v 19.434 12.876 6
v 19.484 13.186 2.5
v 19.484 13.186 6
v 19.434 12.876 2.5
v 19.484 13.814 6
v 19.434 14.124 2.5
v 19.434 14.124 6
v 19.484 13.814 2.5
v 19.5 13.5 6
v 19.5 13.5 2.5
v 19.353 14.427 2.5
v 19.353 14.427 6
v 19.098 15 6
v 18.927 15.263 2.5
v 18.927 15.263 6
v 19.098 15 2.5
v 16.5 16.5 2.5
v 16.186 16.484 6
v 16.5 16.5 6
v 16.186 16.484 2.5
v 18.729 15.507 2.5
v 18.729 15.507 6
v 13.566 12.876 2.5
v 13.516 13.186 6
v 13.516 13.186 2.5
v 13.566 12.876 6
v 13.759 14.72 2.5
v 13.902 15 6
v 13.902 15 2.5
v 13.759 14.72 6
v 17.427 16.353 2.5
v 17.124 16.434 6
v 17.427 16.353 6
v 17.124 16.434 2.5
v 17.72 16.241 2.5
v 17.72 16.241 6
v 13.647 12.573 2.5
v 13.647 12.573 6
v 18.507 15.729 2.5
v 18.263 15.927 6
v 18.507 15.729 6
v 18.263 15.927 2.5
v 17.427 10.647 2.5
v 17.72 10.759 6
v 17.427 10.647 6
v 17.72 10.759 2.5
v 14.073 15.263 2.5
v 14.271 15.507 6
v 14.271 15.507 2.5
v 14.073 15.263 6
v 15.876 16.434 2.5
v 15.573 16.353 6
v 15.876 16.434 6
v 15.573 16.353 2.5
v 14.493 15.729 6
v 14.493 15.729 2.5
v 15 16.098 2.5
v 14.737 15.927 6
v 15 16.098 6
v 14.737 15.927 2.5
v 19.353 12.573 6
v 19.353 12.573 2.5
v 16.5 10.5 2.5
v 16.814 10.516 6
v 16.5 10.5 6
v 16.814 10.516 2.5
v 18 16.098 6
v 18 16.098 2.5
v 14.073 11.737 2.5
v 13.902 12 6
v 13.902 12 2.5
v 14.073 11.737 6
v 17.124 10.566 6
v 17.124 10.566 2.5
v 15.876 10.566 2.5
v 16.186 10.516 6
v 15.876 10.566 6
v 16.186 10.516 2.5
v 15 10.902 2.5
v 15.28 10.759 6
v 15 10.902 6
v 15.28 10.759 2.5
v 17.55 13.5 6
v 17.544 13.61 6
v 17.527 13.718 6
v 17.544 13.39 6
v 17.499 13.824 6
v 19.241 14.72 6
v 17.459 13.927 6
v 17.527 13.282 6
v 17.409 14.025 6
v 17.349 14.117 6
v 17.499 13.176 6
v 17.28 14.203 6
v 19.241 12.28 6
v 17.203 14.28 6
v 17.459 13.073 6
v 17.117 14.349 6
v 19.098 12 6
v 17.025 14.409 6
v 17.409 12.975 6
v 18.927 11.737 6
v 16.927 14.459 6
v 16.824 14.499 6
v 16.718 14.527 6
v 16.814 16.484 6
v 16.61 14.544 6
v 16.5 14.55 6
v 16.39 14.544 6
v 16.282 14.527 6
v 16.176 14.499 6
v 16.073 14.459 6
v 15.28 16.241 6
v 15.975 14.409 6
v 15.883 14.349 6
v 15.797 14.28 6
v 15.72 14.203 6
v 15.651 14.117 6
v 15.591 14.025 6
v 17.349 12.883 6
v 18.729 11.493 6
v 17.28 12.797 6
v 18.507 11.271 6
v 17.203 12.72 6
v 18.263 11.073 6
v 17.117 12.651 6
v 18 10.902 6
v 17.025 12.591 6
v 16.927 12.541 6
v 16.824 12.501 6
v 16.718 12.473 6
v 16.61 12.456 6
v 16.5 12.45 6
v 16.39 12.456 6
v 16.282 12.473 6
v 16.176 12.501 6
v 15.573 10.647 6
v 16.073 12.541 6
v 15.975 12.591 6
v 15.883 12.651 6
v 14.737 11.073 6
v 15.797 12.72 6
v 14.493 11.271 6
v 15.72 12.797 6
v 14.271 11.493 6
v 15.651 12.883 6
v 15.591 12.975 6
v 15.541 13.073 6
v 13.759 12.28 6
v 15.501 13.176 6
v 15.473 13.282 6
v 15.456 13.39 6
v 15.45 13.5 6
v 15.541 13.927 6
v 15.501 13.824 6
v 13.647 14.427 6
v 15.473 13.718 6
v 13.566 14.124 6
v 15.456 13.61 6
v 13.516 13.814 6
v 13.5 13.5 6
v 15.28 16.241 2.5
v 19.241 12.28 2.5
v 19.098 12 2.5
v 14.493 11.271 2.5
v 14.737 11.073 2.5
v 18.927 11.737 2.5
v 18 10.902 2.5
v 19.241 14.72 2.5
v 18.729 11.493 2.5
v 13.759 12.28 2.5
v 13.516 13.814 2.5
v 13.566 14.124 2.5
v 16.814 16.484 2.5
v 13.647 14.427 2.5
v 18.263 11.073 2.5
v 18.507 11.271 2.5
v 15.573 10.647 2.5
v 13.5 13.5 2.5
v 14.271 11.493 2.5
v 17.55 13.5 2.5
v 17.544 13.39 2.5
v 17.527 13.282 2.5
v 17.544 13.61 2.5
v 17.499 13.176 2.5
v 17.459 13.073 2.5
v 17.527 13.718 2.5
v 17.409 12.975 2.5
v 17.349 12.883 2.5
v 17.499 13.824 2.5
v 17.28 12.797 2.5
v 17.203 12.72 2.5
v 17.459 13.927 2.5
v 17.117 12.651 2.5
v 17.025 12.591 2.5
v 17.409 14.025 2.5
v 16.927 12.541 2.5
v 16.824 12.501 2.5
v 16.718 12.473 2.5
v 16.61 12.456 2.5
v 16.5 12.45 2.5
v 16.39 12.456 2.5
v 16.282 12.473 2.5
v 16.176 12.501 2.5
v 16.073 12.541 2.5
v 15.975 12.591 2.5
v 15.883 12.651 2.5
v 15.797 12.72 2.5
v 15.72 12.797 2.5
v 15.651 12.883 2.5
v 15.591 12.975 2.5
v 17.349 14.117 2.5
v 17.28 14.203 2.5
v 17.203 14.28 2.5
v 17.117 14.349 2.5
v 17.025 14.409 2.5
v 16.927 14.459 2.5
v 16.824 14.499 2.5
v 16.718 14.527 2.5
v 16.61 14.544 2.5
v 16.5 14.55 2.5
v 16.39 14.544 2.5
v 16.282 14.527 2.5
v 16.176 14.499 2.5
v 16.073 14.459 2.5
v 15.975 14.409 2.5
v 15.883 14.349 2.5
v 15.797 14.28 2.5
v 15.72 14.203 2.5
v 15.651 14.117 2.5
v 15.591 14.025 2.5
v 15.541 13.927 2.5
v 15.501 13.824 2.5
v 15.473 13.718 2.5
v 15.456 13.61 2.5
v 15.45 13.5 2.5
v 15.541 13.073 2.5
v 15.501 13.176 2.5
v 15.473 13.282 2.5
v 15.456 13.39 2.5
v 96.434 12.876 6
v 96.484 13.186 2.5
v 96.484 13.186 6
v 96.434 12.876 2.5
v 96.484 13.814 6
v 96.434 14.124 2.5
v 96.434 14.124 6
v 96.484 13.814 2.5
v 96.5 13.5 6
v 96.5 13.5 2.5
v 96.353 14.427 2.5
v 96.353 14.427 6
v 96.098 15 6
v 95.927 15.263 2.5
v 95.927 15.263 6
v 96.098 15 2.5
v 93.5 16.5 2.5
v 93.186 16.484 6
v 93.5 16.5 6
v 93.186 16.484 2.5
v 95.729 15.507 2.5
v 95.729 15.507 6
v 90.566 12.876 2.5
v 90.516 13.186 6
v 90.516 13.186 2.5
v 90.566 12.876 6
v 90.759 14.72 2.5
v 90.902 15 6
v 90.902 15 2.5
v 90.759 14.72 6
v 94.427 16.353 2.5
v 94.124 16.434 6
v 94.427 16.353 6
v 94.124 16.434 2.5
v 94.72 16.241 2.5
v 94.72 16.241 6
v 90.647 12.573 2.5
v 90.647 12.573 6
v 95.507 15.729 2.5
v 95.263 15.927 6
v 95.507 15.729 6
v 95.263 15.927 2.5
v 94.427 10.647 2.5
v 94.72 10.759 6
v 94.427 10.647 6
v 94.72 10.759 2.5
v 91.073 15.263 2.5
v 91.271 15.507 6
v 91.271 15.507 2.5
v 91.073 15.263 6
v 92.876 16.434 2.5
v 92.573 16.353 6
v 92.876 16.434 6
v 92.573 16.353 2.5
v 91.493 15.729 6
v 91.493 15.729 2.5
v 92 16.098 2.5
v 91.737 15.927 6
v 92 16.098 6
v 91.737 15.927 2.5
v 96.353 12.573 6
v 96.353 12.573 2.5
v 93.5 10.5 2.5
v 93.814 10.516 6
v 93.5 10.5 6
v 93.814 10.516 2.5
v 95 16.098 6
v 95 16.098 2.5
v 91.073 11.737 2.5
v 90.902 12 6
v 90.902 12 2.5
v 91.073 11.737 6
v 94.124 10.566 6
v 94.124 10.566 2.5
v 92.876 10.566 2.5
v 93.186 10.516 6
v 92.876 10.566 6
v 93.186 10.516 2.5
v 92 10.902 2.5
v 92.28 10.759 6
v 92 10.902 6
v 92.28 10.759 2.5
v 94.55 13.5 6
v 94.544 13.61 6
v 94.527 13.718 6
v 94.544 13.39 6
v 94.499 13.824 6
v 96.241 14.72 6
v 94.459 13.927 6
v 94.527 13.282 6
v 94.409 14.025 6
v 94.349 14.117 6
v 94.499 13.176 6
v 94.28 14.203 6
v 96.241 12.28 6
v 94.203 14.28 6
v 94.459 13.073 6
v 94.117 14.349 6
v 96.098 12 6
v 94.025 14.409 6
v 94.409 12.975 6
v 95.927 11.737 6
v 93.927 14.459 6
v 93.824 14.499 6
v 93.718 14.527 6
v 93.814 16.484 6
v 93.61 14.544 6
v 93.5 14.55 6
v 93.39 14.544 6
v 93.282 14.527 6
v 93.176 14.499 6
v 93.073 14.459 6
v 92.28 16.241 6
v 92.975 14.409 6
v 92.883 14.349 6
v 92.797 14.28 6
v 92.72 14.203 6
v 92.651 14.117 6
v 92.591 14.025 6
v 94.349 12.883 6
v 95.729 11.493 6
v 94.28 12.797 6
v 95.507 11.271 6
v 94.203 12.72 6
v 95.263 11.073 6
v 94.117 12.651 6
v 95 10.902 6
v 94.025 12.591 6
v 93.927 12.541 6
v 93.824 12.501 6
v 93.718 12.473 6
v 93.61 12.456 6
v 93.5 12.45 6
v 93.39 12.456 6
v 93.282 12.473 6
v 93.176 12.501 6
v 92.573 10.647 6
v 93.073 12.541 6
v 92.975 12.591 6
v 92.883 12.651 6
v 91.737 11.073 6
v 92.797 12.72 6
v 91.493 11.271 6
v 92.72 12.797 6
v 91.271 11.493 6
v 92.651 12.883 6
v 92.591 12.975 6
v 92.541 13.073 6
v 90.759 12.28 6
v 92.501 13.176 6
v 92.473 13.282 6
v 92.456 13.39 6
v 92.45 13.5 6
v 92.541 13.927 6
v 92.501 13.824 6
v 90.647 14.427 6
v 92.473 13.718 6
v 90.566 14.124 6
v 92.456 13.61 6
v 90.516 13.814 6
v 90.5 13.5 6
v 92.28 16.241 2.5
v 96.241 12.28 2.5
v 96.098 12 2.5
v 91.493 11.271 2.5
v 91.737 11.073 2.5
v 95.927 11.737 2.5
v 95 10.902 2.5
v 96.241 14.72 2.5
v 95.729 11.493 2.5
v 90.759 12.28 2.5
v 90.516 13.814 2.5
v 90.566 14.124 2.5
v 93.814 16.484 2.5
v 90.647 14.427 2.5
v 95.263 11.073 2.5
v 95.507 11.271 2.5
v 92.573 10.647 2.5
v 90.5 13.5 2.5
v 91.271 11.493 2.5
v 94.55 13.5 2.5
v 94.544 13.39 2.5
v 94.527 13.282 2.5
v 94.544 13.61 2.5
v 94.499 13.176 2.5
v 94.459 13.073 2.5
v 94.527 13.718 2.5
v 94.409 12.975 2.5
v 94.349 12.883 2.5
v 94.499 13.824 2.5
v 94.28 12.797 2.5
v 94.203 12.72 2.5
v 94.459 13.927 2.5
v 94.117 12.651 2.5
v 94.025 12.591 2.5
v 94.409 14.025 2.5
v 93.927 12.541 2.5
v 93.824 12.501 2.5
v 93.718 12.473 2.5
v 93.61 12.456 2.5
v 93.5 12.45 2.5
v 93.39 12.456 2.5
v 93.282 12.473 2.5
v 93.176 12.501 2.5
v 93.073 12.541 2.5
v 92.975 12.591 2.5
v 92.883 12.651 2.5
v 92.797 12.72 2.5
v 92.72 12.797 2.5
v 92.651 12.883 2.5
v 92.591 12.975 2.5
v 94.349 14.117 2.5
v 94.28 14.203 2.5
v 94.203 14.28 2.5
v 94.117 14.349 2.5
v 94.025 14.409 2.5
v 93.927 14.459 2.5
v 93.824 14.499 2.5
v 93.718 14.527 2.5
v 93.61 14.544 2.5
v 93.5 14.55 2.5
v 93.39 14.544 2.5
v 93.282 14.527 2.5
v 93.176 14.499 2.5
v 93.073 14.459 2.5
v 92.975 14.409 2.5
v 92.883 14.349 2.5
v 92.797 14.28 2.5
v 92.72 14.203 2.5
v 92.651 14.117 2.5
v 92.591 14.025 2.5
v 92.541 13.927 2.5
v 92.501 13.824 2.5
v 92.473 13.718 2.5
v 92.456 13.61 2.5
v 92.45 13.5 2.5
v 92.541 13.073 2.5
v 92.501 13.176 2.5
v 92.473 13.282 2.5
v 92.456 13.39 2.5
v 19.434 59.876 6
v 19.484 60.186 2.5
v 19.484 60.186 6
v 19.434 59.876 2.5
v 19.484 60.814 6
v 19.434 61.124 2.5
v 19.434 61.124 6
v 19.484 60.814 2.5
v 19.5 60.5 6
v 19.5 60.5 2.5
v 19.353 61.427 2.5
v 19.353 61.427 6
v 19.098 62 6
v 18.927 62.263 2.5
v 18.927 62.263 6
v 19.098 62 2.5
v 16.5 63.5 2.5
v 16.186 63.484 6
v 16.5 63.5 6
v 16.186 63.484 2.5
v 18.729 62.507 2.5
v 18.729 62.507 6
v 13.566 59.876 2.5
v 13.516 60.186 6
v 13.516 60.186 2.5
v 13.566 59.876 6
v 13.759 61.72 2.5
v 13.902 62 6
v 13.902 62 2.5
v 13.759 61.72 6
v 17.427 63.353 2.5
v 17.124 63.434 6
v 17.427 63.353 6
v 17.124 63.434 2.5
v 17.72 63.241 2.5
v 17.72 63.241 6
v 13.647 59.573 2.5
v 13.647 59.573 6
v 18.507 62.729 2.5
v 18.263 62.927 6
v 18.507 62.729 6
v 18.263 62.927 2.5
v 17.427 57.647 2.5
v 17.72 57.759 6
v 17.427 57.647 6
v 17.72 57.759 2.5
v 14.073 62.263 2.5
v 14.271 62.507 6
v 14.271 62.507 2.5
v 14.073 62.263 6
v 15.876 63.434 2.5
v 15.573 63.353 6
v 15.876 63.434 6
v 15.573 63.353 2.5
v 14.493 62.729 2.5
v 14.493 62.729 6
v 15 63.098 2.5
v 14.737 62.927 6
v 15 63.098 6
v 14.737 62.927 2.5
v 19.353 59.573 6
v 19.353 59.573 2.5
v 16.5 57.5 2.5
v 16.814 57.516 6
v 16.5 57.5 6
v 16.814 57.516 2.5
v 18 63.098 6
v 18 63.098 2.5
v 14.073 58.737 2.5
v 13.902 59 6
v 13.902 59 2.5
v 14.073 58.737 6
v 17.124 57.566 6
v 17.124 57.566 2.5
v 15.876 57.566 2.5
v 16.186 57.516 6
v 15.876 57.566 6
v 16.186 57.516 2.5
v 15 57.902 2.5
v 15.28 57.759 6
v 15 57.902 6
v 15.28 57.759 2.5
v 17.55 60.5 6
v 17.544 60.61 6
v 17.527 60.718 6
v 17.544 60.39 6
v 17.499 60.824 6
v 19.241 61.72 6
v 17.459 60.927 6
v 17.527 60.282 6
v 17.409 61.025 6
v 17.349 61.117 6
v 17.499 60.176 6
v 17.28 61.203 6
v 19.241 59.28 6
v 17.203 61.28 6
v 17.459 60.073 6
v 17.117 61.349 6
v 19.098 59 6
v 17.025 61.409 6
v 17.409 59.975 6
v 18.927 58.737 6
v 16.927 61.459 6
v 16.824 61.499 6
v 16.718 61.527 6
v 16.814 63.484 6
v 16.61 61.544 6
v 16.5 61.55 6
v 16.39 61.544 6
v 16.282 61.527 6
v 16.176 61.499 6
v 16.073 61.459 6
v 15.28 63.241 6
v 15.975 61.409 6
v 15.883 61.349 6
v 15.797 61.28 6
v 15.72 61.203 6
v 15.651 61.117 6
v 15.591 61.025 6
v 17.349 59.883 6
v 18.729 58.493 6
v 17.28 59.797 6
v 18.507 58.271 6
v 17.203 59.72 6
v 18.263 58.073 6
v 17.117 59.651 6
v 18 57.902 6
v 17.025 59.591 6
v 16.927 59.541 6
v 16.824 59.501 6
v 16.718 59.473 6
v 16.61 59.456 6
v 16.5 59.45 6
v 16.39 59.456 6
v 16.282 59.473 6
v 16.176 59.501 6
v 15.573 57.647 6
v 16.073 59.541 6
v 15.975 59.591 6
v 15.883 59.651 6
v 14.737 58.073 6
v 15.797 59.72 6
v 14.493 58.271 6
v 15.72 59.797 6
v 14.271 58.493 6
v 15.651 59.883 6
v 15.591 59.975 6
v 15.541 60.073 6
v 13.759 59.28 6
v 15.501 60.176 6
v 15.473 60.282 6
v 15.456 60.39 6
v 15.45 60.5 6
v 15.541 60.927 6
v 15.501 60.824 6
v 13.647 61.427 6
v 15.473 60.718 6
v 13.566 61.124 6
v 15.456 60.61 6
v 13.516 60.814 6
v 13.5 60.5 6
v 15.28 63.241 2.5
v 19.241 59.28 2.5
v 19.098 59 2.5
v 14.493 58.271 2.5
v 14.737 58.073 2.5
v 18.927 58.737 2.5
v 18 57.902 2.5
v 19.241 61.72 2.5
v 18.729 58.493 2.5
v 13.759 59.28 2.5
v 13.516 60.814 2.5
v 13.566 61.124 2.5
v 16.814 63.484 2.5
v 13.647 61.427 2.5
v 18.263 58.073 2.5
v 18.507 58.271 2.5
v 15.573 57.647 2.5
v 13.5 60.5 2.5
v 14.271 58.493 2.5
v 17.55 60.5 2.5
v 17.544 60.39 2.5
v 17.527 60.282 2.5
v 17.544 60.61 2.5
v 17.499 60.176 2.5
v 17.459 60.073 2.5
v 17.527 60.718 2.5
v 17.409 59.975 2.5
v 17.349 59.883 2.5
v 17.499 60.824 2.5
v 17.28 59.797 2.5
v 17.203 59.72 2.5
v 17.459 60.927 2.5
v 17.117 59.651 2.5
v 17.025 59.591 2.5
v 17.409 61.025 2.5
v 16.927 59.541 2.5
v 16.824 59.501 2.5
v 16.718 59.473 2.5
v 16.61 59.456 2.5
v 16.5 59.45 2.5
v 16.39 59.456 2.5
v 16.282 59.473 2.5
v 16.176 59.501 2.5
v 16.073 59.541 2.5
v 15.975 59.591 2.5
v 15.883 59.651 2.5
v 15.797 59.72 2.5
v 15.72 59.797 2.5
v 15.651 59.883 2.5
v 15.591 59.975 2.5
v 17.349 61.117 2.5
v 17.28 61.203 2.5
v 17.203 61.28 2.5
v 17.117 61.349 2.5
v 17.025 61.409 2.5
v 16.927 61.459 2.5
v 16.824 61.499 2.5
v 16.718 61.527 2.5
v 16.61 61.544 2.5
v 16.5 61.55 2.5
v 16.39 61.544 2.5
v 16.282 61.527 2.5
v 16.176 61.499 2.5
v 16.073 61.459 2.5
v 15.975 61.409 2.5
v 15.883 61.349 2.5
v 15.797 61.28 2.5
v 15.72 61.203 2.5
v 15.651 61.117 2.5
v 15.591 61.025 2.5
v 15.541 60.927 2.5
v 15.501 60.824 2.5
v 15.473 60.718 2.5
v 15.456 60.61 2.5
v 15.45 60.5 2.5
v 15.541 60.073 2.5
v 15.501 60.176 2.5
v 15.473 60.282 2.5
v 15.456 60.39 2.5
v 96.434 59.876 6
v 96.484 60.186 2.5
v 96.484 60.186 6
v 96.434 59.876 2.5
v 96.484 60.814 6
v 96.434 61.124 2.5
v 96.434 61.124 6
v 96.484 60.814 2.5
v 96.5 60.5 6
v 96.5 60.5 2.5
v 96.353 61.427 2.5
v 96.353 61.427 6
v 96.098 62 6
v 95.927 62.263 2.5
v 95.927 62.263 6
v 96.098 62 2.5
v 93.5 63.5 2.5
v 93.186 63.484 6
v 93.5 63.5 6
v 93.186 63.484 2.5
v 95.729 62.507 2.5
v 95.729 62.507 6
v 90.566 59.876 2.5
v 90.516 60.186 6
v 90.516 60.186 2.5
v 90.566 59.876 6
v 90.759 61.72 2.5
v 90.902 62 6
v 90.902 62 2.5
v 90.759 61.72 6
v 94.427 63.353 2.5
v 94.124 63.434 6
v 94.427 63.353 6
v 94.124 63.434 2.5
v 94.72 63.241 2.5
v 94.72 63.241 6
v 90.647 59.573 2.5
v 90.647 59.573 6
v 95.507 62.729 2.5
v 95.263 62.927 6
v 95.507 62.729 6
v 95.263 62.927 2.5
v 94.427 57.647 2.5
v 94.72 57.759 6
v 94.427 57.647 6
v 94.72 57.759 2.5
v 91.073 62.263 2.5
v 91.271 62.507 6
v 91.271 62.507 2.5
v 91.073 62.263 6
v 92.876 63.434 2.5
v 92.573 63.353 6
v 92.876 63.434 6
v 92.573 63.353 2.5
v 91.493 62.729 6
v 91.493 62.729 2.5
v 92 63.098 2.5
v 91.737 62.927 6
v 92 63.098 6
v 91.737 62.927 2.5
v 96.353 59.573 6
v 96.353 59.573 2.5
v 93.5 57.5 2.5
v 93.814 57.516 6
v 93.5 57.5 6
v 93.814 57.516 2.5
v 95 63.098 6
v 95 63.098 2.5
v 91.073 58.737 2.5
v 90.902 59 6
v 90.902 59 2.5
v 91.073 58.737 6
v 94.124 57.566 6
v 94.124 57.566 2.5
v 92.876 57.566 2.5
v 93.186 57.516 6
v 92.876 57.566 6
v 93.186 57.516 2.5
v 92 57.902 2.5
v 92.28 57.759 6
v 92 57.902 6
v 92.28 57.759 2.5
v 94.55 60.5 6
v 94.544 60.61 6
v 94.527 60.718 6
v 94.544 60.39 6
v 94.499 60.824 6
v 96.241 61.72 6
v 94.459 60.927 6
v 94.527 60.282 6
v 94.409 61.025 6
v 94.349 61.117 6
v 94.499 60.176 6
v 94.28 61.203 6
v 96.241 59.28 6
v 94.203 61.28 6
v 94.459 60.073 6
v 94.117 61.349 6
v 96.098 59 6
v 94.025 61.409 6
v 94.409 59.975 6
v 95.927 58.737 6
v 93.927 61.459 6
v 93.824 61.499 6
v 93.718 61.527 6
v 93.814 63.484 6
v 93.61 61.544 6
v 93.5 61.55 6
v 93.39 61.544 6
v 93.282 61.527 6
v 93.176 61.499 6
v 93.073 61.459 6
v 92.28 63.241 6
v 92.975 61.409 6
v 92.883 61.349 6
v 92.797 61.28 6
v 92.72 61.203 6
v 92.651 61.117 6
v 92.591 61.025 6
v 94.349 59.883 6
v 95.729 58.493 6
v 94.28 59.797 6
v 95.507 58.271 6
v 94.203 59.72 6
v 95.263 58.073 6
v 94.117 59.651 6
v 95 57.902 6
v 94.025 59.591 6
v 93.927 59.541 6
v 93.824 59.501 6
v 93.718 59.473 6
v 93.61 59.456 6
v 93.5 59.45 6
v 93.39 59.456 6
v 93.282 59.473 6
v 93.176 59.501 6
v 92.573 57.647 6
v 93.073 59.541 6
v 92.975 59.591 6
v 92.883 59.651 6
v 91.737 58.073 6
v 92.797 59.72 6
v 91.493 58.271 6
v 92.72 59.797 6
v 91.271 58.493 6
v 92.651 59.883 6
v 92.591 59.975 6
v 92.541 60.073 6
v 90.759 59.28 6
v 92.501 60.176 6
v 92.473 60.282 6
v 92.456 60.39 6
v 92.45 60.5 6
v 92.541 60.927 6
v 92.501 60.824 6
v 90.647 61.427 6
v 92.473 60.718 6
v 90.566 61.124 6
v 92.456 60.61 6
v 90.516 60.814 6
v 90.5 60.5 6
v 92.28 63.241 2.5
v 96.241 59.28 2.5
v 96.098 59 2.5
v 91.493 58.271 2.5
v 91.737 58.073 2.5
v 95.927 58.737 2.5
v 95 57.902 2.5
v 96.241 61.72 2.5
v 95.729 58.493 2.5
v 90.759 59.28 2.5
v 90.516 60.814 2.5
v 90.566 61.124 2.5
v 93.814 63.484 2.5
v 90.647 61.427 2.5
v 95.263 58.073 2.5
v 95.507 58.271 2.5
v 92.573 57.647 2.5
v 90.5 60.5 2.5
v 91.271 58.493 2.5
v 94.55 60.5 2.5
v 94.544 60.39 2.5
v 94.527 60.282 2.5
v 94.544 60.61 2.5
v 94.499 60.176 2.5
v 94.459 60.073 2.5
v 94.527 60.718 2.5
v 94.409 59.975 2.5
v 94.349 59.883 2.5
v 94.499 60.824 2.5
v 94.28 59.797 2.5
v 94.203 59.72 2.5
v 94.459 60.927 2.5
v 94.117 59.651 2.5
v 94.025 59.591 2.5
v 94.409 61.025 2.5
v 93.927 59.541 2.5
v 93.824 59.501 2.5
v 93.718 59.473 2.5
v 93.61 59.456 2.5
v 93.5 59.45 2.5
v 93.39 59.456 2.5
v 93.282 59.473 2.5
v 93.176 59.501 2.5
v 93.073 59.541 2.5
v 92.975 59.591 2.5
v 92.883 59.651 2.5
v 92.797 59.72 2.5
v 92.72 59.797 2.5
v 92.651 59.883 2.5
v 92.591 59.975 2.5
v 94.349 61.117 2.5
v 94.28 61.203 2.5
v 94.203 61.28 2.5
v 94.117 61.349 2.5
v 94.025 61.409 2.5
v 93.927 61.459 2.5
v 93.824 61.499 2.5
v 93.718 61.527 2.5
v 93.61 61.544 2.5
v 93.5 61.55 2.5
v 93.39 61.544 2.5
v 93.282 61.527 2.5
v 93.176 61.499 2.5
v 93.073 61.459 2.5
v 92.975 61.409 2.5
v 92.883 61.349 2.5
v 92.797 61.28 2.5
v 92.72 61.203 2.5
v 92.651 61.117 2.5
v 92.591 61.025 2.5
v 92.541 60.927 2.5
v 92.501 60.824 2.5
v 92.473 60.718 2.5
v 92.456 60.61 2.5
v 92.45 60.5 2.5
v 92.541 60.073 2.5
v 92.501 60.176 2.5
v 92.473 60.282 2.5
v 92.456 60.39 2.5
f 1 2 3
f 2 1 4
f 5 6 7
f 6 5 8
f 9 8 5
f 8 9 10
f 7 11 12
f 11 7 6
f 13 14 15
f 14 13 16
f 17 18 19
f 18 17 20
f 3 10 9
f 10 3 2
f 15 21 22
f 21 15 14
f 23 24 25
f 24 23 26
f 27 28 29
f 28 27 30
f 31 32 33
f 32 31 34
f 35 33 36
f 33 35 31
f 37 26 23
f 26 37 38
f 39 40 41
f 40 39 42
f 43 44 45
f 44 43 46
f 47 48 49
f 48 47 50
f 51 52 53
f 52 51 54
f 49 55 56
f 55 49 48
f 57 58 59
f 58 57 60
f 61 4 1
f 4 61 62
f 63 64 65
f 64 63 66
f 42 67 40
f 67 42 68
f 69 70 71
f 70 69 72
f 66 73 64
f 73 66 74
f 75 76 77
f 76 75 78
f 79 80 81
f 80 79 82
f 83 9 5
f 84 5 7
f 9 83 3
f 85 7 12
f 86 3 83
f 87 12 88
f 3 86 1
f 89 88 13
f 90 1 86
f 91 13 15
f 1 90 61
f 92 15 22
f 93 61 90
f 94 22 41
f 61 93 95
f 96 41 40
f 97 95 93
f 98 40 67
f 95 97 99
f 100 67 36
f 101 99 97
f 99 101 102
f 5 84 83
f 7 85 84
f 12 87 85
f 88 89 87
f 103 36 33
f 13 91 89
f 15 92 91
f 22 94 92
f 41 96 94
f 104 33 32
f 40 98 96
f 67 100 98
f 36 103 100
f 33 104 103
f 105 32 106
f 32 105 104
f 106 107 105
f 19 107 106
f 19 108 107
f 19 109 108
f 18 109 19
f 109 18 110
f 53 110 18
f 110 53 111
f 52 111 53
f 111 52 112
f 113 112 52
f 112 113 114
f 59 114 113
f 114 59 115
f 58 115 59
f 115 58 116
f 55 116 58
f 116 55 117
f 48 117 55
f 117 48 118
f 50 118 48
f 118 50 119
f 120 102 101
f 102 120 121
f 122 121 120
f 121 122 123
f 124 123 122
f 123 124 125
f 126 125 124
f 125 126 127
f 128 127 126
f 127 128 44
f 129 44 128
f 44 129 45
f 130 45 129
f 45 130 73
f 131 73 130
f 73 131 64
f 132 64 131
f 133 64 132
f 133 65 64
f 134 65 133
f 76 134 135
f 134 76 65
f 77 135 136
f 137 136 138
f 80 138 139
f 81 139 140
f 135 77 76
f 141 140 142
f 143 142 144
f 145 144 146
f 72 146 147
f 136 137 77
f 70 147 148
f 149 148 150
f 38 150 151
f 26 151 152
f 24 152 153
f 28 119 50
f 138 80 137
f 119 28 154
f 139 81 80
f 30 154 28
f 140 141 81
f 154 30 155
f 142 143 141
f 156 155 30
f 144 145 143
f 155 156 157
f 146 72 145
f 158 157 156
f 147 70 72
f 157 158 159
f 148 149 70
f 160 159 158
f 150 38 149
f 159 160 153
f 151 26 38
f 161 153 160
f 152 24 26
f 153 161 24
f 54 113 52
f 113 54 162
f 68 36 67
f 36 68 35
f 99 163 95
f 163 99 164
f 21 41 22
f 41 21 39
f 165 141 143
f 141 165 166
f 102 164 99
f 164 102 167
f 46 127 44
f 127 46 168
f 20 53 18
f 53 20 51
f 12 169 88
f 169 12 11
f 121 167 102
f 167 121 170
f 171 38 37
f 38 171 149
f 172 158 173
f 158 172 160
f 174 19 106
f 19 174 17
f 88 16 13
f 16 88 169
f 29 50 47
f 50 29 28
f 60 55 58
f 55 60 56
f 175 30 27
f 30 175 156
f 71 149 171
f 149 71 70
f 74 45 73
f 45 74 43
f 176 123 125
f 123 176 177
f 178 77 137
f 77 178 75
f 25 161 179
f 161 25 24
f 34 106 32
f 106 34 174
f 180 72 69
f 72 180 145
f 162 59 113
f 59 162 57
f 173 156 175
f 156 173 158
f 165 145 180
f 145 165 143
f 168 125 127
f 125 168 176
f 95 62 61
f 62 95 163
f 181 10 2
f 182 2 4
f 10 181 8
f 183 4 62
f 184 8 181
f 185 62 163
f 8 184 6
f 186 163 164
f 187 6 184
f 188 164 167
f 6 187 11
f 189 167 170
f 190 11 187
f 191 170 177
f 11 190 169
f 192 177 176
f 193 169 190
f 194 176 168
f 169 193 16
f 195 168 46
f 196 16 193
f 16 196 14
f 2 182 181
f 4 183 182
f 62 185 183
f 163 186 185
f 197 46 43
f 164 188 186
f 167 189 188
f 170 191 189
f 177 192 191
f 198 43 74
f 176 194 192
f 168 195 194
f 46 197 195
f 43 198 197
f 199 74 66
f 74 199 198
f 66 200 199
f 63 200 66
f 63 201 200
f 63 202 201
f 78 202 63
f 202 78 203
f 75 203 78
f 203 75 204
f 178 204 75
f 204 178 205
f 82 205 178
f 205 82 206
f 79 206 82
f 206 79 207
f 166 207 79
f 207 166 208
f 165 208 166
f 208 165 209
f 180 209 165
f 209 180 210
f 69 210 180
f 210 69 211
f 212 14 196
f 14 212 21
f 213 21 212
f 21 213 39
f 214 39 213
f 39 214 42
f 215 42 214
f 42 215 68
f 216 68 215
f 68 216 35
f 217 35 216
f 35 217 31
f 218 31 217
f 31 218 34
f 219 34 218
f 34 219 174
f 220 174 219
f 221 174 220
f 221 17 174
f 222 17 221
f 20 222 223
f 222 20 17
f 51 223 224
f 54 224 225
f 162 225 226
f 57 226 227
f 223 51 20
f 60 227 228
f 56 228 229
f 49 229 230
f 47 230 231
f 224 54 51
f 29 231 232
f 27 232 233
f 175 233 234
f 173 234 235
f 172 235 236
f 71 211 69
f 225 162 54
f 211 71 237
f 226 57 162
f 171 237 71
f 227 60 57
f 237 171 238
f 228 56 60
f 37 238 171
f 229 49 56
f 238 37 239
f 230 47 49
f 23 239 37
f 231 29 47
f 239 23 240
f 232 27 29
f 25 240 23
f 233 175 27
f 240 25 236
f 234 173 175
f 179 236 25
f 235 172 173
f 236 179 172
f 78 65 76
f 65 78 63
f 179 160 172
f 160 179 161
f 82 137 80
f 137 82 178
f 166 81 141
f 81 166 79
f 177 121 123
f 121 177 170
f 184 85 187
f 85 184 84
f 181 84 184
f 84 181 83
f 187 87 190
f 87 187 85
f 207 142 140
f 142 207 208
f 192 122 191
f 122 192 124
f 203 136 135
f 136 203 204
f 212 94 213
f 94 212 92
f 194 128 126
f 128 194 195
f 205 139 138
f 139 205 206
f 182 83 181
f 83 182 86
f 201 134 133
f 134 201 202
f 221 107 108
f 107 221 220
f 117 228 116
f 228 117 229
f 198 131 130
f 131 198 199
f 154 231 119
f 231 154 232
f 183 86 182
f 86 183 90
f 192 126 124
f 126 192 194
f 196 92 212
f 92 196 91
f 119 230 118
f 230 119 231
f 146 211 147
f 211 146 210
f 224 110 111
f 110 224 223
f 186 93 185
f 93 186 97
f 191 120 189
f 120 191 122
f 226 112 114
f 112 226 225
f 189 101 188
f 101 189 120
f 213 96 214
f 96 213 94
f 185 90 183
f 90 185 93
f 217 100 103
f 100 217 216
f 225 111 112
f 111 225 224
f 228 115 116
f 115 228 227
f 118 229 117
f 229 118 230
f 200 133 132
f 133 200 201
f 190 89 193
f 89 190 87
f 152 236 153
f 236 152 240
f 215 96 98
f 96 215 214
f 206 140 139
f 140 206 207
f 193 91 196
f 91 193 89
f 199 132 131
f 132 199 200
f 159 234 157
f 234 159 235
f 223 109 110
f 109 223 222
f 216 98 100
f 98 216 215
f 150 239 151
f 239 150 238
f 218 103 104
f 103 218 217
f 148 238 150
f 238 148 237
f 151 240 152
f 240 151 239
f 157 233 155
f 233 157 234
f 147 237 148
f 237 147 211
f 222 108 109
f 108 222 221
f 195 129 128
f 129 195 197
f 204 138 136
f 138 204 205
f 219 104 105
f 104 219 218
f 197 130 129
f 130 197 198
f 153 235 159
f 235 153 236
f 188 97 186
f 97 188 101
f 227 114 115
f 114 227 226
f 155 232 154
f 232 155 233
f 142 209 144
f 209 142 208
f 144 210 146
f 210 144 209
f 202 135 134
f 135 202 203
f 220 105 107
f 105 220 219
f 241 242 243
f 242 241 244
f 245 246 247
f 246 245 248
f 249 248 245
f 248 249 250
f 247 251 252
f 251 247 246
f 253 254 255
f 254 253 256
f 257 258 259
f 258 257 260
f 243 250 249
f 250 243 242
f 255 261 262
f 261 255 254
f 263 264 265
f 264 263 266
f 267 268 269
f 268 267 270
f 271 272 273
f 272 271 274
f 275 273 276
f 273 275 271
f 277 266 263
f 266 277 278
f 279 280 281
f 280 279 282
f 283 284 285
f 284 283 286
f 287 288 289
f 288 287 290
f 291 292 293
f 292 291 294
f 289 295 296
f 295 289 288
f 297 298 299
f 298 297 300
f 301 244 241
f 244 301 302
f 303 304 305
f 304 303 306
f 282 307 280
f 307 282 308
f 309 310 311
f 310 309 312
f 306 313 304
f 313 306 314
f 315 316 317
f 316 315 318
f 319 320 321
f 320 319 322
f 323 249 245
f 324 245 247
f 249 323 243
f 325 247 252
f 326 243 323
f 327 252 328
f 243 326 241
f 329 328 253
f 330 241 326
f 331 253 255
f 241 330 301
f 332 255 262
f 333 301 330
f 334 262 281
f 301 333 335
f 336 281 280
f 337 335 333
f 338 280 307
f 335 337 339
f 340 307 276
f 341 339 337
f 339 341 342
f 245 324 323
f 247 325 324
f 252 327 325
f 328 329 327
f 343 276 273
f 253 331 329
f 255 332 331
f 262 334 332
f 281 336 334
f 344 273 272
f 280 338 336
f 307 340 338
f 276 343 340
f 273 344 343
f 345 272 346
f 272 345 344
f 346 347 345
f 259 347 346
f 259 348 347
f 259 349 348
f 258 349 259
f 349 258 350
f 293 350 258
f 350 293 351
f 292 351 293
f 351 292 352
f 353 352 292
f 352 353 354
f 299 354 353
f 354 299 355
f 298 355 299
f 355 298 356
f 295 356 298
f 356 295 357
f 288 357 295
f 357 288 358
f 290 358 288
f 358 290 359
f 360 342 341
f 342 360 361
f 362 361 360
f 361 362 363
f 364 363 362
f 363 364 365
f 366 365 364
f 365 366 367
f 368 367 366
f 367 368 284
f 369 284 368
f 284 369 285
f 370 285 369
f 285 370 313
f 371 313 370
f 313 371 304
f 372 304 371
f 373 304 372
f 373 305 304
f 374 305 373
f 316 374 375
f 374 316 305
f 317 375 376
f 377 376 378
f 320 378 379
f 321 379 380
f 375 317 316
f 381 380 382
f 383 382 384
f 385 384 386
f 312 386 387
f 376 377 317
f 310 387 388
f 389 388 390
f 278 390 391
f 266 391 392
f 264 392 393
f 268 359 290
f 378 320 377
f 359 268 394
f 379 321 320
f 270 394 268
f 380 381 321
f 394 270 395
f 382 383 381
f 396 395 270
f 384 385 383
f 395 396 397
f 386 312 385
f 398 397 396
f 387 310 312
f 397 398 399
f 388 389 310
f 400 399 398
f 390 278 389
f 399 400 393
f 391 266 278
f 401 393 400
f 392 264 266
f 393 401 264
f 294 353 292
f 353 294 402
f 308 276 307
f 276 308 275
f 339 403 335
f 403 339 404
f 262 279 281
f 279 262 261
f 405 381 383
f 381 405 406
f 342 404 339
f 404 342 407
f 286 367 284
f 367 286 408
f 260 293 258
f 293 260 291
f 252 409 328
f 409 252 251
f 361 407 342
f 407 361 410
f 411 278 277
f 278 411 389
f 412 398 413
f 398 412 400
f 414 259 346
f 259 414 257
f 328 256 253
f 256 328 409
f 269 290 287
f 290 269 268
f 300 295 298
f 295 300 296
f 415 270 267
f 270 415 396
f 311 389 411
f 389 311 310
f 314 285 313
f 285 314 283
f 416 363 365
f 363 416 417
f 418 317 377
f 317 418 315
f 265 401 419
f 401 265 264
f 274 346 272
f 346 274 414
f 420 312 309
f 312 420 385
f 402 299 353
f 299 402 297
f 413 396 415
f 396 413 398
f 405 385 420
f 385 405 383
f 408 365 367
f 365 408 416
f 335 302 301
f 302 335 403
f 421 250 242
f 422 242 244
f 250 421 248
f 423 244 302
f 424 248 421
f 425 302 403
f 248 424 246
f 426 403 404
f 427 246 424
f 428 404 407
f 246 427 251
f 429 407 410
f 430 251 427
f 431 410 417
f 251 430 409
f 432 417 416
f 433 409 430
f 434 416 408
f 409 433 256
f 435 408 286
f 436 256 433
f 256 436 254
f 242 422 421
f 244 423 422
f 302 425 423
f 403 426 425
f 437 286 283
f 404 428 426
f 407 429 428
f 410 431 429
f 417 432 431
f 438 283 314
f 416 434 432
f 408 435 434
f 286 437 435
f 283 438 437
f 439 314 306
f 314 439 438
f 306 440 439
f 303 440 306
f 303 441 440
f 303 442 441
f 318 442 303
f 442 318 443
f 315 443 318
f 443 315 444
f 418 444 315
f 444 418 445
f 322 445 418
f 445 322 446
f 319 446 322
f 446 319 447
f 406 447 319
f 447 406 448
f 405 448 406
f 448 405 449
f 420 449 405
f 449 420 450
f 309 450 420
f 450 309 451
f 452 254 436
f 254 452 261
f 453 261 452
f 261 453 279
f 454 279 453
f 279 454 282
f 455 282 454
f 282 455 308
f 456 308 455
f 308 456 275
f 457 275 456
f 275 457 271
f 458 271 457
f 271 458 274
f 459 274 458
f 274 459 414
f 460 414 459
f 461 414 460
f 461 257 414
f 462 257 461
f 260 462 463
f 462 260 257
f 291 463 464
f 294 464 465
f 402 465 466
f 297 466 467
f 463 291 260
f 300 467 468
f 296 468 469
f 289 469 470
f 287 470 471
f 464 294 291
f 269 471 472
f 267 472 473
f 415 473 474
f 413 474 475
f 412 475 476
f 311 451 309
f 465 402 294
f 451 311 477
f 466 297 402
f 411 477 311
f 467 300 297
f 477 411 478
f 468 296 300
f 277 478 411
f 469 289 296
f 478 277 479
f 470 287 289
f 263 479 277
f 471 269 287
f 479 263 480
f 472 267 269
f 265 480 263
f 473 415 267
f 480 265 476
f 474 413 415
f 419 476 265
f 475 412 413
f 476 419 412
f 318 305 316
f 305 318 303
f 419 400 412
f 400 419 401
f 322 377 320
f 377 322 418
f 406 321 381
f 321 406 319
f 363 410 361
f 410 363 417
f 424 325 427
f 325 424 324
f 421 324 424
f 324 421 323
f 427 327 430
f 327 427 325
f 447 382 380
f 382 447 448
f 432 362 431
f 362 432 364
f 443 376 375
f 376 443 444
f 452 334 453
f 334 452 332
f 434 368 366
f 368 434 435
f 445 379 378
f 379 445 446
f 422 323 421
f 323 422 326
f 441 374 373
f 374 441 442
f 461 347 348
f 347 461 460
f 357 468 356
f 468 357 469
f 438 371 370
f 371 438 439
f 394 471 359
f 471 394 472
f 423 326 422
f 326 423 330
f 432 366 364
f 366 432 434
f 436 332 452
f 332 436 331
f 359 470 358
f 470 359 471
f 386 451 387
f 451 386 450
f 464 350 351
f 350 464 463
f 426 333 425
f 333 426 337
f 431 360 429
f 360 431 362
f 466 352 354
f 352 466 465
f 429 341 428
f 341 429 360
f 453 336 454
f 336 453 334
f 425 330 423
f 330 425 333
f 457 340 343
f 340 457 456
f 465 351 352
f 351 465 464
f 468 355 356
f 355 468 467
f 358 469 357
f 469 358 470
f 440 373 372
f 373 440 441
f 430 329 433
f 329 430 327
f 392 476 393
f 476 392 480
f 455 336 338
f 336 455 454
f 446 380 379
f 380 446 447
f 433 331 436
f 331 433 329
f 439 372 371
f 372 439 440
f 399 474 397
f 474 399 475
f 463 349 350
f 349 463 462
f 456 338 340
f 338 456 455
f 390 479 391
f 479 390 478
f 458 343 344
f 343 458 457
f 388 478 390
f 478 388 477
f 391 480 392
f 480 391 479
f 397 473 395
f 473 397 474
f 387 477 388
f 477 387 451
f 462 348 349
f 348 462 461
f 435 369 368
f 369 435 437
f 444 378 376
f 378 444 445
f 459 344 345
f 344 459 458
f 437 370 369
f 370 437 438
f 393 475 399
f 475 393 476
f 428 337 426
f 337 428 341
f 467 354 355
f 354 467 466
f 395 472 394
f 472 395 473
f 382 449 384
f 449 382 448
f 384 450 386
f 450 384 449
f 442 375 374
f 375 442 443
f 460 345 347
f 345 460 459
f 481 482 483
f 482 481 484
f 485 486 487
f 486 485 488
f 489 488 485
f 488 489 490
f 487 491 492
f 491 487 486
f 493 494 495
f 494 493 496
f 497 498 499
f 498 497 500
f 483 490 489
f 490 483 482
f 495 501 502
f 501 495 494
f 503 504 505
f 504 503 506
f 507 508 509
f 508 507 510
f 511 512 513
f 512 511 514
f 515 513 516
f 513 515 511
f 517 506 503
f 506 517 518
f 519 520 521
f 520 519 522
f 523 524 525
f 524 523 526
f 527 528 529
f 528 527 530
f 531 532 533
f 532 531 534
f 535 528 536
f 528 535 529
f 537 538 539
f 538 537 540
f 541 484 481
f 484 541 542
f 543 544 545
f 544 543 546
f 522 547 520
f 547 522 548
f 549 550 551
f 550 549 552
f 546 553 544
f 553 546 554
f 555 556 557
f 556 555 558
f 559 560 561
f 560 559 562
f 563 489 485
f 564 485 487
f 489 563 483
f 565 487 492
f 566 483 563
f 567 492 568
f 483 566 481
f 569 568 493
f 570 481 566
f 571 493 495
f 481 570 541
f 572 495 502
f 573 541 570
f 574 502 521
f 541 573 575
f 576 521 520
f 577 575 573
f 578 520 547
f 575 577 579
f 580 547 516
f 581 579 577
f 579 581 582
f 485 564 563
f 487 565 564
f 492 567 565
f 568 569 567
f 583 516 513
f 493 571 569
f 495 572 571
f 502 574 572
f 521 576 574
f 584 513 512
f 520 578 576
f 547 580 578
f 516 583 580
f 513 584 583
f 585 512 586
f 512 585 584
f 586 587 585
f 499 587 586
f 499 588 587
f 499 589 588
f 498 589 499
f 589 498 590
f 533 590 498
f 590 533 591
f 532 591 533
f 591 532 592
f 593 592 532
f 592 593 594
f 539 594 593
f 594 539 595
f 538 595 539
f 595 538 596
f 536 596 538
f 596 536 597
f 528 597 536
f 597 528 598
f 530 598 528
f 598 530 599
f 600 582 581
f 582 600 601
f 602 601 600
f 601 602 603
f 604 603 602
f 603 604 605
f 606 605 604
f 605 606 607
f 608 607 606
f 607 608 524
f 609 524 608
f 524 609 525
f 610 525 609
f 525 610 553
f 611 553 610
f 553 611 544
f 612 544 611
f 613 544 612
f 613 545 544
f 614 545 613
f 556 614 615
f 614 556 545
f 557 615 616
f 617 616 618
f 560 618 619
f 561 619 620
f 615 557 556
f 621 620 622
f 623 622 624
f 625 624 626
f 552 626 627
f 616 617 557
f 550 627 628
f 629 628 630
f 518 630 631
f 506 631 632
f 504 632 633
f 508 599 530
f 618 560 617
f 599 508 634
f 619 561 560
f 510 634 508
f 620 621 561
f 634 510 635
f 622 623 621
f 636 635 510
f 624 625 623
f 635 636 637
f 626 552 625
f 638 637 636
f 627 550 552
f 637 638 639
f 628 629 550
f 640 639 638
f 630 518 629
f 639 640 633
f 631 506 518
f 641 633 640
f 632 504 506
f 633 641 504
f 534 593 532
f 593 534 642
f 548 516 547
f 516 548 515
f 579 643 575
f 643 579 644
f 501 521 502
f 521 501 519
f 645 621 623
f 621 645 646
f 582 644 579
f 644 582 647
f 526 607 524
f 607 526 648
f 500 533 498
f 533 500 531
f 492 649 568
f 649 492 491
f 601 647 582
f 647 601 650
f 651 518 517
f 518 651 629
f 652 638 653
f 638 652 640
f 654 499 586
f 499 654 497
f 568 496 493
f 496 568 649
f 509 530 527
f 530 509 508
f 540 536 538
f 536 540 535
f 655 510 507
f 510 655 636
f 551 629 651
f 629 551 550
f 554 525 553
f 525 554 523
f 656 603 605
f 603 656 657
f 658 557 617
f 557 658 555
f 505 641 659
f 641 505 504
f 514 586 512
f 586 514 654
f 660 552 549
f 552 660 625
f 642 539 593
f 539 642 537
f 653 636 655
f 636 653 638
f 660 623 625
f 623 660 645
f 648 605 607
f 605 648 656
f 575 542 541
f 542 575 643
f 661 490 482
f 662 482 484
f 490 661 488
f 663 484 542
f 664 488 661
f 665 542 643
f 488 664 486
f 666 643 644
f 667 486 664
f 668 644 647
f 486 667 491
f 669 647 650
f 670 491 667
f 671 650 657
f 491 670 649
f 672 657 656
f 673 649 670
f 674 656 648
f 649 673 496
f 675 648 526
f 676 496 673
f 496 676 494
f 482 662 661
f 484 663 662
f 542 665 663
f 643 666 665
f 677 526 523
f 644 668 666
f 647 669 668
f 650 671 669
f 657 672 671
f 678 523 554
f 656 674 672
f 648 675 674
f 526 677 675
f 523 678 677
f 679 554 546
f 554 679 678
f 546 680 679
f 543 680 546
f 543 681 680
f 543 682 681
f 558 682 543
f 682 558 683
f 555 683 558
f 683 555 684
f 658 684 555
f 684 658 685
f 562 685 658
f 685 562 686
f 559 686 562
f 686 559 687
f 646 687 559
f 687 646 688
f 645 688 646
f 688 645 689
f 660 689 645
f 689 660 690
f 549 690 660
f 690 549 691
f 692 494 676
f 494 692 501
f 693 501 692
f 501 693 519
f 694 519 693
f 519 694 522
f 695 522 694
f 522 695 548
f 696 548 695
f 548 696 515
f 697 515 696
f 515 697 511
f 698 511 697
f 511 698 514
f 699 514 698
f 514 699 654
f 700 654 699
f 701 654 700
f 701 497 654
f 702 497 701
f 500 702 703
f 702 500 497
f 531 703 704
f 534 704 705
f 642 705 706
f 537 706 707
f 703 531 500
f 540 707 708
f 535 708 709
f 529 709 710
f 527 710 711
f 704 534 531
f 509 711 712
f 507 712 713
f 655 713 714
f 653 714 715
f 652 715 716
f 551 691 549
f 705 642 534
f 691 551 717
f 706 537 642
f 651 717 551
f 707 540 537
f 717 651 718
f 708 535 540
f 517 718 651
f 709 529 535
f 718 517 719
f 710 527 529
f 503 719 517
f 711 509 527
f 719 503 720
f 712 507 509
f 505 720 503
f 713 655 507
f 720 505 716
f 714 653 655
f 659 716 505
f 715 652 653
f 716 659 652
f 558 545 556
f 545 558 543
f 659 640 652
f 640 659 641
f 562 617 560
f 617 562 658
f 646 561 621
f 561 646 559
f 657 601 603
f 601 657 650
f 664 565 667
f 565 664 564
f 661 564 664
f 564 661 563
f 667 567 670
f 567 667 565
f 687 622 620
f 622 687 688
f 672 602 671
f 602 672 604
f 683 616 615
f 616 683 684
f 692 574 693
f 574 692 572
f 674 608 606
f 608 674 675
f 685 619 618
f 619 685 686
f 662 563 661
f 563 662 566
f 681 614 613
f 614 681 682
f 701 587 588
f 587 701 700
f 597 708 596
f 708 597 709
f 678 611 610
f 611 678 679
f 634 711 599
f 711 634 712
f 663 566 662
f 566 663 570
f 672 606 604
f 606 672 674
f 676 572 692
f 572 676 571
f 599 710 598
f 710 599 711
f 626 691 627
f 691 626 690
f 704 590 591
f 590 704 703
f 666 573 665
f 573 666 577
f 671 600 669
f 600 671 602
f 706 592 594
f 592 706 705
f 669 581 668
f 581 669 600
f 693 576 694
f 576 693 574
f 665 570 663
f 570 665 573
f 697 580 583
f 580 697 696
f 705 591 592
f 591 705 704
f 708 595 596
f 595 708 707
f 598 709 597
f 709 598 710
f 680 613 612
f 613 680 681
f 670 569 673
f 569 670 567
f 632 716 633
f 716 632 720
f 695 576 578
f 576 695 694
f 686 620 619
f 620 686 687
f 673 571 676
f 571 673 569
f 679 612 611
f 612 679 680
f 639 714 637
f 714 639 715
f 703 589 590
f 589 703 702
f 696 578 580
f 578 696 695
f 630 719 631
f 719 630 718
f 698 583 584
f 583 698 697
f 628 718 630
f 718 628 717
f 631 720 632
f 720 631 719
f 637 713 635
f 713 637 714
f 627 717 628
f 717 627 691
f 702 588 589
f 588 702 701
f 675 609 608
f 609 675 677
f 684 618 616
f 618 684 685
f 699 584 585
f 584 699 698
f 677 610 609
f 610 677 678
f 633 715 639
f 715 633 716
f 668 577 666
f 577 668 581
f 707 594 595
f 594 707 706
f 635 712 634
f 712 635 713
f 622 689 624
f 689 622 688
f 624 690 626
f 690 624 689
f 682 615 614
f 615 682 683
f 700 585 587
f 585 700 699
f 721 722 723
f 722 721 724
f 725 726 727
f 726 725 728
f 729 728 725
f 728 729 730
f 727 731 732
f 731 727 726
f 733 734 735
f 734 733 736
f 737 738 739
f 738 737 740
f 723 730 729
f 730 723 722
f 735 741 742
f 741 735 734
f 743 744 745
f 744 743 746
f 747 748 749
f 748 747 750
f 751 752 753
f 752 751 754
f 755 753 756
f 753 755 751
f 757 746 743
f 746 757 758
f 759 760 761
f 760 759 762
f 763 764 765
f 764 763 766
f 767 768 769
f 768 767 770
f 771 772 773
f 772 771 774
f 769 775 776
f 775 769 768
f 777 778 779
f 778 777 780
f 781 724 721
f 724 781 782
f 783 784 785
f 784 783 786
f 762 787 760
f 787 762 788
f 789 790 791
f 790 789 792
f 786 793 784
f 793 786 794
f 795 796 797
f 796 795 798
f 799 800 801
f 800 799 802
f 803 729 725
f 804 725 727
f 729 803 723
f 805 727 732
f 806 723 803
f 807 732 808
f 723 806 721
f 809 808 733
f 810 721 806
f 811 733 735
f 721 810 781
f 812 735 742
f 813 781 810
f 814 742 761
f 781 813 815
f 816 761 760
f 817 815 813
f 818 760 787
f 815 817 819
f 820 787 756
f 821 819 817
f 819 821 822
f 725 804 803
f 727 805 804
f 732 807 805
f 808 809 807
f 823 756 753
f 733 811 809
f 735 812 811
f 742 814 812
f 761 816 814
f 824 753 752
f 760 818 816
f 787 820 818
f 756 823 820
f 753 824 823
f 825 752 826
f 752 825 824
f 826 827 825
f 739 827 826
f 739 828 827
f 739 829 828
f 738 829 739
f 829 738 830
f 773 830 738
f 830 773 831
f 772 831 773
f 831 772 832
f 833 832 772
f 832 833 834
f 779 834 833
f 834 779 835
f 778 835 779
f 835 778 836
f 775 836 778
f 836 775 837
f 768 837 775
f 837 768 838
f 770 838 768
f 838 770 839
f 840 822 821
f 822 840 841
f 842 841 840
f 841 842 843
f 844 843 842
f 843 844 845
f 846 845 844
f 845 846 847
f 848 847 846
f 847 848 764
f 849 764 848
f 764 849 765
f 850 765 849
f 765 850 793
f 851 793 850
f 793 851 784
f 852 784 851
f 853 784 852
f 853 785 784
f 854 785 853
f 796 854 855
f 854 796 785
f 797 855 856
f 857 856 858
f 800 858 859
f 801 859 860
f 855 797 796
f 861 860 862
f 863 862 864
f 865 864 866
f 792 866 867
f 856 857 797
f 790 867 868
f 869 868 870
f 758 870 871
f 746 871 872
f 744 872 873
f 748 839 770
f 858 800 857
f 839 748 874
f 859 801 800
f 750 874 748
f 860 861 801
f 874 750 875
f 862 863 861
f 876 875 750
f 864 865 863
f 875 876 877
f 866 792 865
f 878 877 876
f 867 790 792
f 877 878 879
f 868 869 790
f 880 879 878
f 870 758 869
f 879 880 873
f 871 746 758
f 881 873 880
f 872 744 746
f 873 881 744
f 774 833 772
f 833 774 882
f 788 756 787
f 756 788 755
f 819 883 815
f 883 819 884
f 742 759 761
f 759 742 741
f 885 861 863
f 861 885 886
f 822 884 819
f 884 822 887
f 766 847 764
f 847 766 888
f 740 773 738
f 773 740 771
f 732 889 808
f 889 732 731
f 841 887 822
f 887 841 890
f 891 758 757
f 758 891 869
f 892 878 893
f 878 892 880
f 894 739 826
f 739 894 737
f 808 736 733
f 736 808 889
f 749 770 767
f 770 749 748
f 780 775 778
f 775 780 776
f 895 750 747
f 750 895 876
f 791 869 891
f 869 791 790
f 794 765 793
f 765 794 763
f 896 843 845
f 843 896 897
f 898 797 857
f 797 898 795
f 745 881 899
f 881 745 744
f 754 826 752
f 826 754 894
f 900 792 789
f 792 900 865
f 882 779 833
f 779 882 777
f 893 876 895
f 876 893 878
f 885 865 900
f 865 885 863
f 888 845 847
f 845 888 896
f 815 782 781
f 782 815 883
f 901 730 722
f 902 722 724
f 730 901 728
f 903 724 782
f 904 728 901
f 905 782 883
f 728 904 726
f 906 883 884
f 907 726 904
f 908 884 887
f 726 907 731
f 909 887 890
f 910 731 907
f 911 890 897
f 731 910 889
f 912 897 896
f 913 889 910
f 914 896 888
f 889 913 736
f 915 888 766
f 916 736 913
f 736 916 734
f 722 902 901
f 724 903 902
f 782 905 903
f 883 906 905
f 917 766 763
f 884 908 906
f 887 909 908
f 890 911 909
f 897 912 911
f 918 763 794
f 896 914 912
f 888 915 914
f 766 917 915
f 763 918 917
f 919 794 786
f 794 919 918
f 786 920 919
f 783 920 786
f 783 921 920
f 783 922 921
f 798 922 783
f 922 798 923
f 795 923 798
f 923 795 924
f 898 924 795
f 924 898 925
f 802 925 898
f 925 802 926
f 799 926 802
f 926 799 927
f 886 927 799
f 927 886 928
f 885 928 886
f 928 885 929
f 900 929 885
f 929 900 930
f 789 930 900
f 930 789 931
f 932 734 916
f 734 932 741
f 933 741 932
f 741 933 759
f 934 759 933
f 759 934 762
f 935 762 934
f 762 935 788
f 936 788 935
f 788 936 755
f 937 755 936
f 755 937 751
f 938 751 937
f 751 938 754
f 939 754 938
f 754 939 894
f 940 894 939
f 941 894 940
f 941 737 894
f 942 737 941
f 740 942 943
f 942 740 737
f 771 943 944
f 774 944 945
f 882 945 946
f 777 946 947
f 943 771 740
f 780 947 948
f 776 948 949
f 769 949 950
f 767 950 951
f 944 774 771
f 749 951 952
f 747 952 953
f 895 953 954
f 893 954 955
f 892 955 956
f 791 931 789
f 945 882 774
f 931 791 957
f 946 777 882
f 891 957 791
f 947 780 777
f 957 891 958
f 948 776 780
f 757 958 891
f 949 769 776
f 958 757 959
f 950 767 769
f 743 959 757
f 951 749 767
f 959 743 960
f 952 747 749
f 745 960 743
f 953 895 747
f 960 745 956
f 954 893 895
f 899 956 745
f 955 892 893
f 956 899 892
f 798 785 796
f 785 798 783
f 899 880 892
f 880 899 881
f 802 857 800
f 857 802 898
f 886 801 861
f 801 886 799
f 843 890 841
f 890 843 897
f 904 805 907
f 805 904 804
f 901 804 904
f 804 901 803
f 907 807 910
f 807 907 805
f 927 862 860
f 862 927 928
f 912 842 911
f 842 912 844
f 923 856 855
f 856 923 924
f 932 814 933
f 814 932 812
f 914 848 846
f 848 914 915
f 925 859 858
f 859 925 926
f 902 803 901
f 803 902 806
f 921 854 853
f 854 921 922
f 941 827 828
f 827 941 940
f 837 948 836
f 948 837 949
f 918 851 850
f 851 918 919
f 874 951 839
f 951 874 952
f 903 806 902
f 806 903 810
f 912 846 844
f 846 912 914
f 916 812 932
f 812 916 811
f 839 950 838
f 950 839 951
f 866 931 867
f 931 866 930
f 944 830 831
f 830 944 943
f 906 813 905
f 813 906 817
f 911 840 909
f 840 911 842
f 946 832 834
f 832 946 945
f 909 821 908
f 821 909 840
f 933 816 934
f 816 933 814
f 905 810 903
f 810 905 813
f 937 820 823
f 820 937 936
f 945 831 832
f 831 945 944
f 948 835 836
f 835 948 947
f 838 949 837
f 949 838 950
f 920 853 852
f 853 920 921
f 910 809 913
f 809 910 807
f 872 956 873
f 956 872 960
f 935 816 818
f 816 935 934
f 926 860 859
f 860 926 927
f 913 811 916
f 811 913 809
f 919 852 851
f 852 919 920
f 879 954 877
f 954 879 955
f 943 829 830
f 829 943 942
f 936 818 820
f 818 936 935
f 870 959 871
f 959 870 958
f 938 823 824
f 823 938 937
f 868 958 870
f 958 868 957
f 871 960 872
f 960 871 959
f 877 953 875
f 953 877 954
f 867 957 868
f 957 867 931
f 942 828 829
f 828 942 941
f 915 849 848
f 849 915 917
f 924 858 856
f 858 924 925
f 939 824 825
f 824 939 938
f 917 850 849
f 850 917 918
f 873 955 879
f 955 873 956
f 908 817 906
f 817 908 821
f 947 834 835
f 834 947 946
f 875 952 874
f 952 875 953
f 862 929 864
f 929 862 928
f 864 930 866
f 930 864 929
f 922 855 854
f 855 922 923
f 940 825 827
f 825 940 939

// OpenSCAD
// file: ../../00_common/screw_bosses.scad
// =============================================================================
// OpenMotorBridge - Screw Bosses & Fastener Primitives
// =============================================================================
// File: hardware/cad/scad/00_common/screw_bosses.scad
// Description: Reusable parametric modules for screw standoffs, corner clamping
//              posts, and mounting ears.
// =============================================================================

include <parameters.scad>;

// 1. Cylindrical Screw Standoff Boss (with center hole)
module screw_boss(outer_r=2.5, inner_r=1.2, h=5.0) {
    difference() {
        cylinder(r=outer_r, h=h, center=false);
        translate([0, 0, -0.1])
            cylinder(r=inner_r, h=h + 0.2, center=false);
    }
}

// 2. Rectangular Corner Clamping Post (with center screw hole)
module corner_screw_post(size_x=5.0, size_y=5.0, h=12.0, hole_r=1.65, hole_h=10.0, hole_offset_z=2.0) {
    difference() {
        cube(size=[size_x, size_y, h], center=false);
        translate([size_x/2.0, size_y/2.0, hole_offset_z])
            cylinder(r=hole_r, h=hole_h + 0.1, center=false);
    }
}

// 3. M4 Silentblock Outer Mounting Ear (Centered in Y around y=0, extends along +X)
module mounting_ear_m4(ear_len=14.0, ear_w=12.0, ear_h=5.0, hole_r=2.2) {
    difference() {
        union() {
            translate([0, -ear_w/2.0, 0])
                cube(size=[ear_len - ear_w/2.0, ear_w, ear_h], center=false);
            translate([ear_len - ear_w/2.0, 0, 0])
                cylinder(r=ear_w/2.0, h=ear_h, center=false);
        }
        translate([ear_len - ear_w/2.0, 0, -0.1])
            cylinder(r=hole_r, h=ear_h + 0.2, center=false);
    }
}

// 4. Captive Hex Nut Pocket (DIN 934 / DIN 985 with center screw through-hole)
module hex_nut_pocket(sw=NUT_M4_SW, h=NUT_M4_H, screw_r=M4_SCREW_HOLE_R, through_h=10.0) {
    // Hexagonal pocket (flat-to-flat SW converted to circle radius: r = sw / sqrt(3))
    hex_r = sw / sqrt(3);
    union() {
        // Hexagonal nut pocket
        cylinder(r=hex_r, h=h, center=false, $fn=6);
        // Screw clearance through-hole
        translate([0, 0, -through_h/2.0])
            cylinder(r=screw_r, h=through_h + h, center=false, $fn=30);
    }
}
// main file
// =============================================================================
// OpenMotorBridge - Main Box: PCB Screw Standoffs (4x M2.5 Platinendome)
// =============================================================================
// File: hardware/cad/scad/01_main_box/parts/002_pcb_standoffs.scad
// Description: Parametric screw bosses for the 85.0 x 55.0 mm PCBA 01 mainboard
//              with 77.0 x 47.0 mm mounting pitch. 100% Soldering-Iron Free
//              using PA12 self-tapping / thread-forming pilot holes (Ø 2.1 mm).
// =============================================================================

include <../../00_common/parameters.scad>;
include <../../00_common/screw_bosses.scad>;

module main_box_pcb_standoffs(pcb_x_offset=12.5, pcb_y_offset=9.5, h=3.5) {
    // PCBA 01 size: 85.0 x 55.0 mm. Mounting holes at (4,4), (81,4), (4,51), (81,51) relative to PCB.
    // Mounting pitch: 77.0 mm in X, 47.0 mm in Y.
    standoff_z = MAIN_BOX_WALL; // Floor thickness = 2.5 mm

    // Bottom-Left (Front-Left in vehicle orientation)
    translate([pcb_x_offset + 4.0, pcb_y_offset + 4.0, standoff_z])
        screw_boss(outer_r=3.0, inner_r=M2_5_PILOT_HOLE_R, h=h);

    // Bottom-Right (Front-Right)
    translate([pcb_x_offset + 81.0, pcb_y_offset + 4.0, standoff_z])
        screw_boss(outer_r=3.0, inner_r=M2_5_PILOT_HOLE_R, h=h);

    // Top-Left (Rear-Left)
    translate([pcb_x_offset + 4.0, pcb_y_offset + 51.0, standoff_z])
        screw_boss(outer_r=3.0, inner_r=M2_5_PILOT_HOLE_R, h=h);

    // Top-Right (Rear-Right)
    translate([pcb_x_offset + 81.0, pcb_y_offset + 51.0, standoff_z])
        screw_boss(outer_r=3.0, inner_r=M2_5_PILOT_HOLE_R, h=h);
}

// Standalone preview
main_box_pcb_standoffs();
